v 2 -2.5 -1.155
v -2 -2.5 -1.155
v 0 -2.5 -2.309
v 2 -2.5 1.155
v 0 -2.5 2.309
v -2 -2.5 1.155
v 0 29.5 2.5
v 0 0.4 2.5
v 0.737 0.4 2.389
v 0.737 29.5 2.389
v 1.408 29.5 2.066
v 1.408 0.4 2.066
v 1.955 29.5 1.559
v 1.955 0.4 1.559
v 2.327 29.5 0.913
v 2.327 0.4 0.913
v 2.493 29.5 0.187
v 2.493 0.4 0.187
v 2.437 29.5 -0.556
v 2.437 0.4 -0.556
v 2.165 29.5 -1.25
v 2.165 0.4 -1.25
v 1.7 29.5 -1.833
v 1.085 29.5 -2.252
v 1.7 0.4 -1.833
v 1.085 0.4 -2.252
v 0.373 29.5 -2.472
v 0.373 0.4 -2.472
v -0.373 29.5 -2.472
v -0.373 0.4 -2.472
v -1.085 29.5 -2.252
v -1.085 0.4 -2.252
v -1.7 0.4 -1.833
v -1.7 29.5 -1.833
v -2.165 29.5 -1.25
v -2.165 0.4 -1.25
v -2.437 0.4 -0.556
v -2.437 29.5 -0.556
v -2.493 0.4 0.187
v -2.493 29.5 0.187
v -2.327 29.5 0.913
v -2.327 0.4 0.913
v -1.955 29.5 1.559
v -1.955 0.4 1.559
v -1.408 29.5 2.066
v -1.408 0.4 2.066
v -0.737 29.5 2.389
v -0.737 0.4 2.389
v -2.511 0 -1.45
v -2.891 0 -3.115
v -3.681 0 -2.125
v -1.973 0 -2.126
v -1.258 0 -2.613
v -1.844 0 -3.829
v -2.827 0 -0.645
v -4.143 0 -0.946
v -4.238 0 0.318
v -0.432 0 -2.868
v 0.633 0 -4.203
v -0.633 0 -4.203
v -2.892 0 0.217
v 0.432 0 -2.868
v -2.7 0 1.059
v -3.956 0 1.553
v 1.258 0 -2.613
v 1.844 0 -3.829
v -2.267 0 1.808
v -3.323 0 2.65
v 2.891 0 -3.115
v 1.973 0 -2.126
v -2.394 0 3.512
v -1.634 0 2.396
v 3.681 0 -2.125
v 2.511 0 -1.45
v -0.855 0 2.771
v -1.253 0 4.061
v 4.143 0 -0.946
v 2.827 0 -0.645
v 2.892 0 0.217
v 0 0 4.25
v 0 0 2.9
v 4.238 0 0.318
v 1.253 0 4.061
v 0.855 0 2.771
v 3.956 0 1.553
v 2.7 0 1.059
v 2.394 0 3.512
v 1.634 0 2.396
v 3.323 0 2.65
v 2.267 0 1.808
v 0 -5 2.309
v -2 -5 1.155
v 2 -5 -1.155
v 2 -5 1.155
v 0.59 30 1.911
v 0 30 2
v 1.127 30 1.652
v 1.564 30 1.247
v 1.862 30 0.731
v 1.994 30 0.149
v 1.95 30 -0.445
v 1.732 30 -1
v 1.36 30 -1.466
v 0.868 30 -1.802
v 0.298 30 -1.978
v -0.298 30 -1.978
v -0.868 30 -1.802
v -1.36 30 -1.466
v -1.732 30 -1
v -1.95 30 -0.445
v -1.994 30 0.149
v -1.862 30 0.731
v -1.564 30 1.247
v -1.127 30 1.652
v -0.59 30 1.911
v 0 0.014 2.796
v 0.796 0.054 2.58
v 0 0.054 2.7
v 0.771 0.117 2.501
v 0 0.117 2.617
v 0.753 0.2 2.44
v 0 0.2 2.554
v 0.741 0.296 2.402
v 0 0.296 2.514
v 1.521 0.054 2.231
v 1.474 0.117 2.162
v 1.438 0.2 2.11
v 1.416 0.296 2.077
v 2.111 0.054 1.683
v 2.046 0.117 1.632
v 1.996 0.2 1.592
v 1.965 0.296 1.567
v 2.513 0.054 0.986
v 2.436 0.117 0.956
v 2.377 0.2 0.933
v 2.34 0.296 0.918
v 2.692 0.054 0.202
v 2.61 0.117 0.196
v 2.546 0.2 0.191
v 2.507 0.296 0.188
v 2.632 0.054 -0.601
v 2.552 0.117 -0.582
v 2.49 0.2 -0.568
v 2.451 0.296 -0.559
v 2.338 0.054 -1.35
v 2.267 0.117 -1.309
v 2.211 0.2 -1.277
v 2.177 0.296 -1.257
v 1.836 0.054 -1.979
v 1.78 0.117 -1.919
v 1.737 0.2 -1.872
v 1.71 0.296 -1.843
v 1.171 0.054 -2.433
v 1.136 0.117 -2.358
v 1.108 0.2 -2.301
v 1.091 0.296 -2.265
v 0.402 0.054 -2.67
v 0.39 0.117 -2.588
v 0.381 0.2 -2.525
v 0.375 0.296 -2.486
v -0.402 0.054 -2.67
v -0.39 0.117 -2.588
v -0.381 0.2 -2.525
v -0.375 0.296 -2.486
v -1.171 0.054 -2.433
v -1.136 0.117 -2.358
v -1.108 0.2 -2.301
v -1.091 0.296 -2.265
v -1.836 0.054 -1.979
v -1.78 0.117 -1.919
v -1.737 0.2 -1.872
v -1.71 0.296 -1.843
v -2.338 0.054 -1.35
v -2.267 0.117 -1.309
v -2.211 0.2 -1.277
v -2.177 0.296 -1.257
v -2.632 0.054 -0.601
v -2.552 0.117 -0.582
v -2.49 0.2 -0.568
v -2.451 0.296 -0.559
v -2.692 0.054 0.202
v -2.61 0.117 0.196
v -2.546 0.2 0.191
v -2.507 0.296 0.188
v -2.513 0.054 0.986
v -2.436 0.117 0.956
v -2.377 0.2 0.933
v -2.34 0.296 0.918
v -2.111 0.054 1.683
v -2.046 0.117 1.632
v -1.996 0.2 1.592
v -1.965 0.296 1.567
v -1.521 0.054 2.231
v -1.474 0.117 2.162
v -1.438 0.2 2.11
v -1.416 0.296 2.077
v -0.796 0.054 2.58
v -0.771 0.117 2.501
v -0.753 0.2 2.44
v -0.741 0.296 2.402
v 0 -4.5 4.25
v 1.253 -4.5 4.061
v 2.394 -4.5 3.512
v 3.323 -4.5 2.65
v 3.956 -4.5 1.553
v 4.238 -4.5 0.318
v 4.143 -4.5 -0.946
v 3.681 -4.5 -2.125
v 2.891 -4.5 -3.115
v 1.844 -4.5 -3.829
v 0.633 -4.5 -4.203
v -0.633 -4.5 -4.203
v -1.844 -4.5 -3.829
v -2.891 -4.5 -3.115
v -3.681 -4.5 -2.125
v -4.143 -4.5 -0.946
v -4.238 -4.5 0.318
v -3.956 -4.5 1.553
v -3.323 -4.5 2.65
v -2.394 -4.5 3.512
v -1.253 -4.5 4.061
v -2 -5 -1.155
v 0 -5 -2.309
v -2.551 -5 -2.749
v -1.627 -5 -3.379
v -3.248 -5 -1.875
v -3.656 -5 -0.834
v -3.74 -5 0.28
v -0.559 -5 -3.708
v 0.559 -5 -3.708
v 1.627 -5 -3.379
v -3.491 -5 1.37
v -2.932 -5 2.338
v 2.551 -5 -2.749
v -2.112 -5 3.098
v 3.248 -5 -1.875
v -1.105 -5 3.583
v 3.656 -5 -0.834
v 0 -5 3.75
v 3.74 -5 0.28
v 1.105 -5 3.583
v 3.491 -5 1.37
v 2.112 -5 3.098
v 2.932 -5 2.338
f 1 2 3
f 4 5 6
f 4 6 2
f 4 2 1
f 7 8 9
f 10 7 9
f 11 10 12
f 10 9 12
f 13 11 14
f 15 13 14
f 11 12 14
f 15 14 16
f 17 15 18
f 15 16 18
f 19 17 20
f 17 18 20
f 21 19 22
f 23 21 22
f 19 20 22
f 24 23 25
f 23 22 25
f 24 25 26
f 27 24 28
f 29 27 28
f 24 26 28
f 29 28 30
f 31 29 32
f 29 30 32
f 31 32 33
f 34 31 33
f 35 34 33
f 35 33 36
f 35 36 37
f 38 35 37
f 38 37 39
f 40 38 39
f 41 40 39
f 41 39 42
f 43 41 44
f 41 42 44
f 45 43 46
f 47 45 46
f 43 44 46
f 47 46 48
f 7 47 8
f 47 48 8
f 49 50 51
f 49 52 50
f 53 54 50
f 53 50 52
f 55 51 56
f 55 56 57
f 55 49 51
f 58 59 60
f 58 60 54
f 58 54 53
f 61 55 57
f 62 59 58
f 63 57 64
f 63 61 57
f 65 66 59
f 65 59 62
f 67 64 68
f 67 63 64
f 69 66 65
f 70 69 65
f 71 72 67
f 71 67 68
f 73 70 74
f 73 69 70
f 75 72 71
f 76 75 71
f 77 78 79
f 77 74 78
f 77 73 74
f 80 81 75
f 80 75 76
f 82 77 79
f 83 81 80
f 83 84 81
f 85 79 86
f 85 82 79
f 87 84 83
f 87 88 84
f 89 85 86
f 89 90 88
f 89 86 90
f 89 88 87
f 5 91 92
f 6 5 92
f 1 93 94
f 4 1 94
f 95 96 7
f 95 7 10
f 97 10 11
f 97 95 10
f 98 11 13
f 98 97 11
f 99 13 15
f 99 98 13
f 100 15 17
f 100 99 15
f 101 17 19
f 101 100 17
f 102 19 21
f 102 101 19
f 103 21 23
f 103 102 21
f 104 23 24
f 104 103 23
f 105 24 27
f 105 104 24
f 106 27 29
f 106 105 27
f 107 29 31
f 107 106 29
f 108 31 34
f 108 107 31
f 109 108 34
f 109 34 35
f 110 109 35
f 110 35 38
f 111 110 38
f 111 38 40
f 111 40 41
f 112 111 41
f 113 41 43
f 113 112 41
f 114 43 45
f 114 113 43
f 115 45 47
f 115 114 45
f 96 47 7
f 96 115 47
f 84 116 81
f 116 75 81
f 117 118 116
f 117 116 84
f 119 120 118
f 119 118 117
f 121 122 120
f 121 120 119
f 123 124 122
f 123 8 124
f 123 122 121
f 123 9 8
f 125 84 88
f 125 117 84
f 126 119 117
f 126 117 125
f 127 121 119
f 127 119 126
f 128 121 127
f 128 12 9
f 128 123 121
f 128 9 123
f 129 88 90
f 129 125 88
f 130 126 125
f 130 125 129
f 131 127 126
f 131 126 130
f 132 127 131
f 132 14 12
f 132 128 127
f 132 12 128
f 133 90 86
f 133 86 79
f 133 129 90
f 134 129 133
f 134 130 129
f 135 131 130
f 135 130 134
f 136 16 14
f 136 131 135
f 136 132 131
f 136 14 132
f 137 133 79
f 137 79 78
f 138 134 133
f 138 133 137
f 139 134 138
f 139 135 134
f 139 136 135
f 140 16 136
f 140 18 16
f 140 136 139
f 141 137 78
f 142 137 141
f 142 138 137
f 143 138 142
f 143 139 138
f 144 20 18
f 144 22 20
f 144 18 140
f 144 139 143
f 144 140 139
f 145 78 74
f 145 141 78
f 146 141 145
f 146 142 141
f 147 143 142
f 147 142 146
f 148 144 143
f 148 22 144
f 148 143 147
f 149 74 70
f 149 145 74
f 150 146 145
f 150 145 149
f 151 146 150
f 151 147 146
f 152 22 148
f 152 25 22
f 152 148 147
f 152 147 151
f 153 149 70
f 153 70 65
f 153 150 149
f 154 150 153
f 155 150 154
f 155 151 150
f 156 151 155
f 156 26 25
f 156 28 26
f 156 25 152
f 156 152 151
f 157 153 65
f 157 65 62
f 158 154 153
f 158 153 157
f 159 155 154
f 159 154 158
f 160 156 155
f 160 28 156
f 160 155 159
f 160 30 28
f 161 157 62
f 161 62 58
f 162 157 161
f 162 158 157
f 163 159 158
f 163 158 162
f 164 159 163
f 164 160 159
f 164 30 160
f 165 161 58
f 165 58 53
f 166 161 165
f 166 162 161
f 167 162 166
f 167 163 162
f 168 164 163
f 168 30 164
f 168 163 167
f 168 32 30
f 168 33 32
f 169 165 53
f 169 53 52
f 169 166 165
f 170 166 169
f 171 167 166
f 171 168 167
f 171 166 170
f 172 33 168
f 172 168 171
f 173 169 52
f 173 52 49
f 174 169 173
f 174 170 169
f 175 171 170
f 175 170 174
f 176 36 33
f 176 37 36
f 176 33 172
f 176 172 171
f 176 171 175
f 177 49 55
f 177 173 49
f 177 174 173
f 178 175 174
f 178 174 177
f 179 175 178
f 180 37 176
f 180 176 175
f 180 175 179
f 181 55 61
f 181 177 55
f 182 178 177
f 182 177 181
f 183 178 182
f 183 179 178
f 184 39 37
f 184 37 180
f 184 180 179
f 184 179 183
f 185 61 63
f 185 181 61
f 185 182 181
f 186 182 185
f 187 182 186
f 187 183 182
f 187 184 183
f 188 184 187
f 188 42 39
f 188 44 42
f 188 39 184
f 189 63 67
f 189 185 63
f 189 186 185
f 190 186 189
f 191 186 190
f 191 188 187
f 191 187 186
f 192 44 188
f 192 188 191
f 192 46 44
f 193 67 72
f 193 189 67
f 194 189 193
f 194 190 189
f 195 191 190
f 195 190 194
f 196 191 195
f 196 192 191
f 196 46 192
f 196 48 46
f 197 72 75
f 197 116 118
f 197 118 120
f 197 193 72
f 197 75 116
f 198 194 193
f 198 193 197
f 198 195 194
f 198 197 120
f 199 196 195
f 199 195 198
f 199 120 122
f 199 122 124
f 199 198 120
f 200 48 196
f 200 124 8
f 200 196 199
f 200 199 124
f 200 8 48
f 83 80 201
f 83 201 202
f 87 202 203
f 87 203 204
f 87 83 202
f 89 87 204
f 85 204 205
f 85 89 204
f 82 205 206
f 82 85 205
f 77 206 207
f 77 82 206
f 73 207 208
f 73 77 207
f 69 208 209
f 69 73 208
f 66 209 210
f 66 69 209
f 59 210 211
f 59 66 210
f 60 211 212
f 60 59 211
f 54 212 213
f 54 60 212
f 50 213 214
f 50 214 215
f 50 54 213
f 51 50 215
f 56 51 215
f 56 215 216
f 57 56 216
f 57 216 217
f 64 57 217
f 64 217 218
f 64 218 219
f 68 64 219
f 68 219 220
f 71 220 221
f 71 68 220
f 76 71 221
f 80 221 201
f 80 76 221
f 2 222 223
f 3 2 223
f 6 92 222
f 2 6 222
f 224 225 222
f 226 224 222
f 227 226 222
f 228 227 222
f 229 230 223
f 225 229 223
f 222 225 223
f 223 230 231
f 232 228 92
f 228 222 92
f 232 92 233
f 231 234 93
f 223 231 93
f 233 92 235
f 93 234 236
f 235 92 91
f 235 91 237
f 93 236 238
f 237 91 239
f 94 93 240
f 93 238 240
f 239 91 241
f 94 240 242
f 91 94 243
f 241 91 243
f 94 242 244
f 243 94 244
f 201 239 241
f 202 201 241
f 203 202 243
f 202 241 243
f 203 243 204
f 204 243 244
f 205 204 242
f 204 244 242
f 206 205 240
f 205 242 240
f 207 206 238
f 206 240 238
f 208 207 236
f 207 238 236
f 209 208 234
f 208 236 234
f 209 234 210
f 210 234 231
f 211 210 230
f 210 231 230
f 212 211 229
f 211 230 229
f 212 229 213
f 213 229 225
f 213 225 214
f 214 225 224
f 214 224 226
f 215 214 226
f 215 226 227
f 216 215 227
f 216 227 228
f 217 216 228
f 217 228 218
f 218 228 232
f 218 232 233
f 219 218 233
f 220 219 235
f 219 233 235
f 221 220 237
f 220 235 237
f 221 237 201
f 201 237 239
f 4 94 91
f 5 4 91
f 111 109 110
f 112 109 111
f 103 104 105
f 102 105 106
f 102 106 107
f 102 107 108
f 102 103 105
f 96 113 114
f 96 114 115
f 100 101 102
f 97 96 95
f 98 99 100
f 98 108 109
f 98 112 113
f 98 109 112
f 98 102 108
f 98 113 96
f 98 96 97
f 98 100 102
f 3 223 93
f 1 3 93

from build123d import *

# Parameters (mm, degrees)
SKETCH2_R           = 2.5
BOSS_EXTRUDE1_DEPTH = 30
SKETCH3_R           = 4.25
BOSS_EXTRUDE2_DEPTH = 5
FILLET1_R           = 0.4
CHAMFER1_SIZE       = 0.5
CUT_EXTRUDE1_DEPTH  = 2.5


with BuildPart() as part:
    # Sketch2 → Boss-Extrude1 (new body)
    with BuildSketch(Plane(origin=(0, 0, 0), x_dir=(1, 0, 0), z_dir=(0, 1, 0))):
        with Locations(Location((0, 0, 0), (0, 0, 270))):
            Circle(SKETCH2_R)
    extrude(amount=BOSS_EXTRUDE1_DEPTH)

    # Sketch3 → Boss-Extrude2 (add)
    with BuildSketch(Plane(origin=(0, 0, 0), x_dir=(1, 0, 0), z_dir=(0, 1, 0))):
        with Locations(Location((0, 0, 0), (0, 0, 270))):
            Circle(SKETCH3_R)
    extrude(amount=-BOSS_EXTRUDE2_DEPTH)

    # Fillet1
    fillet1_edges = [part.edges().sort_by_distance(p)[0] for p in [
        (0, 0, -2.5),
    ]]
    fillet(fillet1_edges, radius=FILLET1_R)

    # Chamfer1
    chamfer1_edges = [part.edges().sort_by_distance(p)[0] for p in [
        (0, 30, -2.5),
        (0, -5, -4.25),
    ]]
    chamfer(chamfer1_edges, length=CHAMFER1_SIZE)

    # Sketch4 → Cut-Extrude1 (cut)
    with BuildSketch(Plane.XZ.offset(5)):
        Polygon((0, 2.309401077), (-2, 1.154700538), (-2, -1.154700538), (0, -2.309401077), (2, -1.154700538), (2, 1.154700538), align=None)
    extrude(amount=-CUT_EXTRUDE1_DEPTH, mode=Mode.SUBTRACT)


solid = part.part
